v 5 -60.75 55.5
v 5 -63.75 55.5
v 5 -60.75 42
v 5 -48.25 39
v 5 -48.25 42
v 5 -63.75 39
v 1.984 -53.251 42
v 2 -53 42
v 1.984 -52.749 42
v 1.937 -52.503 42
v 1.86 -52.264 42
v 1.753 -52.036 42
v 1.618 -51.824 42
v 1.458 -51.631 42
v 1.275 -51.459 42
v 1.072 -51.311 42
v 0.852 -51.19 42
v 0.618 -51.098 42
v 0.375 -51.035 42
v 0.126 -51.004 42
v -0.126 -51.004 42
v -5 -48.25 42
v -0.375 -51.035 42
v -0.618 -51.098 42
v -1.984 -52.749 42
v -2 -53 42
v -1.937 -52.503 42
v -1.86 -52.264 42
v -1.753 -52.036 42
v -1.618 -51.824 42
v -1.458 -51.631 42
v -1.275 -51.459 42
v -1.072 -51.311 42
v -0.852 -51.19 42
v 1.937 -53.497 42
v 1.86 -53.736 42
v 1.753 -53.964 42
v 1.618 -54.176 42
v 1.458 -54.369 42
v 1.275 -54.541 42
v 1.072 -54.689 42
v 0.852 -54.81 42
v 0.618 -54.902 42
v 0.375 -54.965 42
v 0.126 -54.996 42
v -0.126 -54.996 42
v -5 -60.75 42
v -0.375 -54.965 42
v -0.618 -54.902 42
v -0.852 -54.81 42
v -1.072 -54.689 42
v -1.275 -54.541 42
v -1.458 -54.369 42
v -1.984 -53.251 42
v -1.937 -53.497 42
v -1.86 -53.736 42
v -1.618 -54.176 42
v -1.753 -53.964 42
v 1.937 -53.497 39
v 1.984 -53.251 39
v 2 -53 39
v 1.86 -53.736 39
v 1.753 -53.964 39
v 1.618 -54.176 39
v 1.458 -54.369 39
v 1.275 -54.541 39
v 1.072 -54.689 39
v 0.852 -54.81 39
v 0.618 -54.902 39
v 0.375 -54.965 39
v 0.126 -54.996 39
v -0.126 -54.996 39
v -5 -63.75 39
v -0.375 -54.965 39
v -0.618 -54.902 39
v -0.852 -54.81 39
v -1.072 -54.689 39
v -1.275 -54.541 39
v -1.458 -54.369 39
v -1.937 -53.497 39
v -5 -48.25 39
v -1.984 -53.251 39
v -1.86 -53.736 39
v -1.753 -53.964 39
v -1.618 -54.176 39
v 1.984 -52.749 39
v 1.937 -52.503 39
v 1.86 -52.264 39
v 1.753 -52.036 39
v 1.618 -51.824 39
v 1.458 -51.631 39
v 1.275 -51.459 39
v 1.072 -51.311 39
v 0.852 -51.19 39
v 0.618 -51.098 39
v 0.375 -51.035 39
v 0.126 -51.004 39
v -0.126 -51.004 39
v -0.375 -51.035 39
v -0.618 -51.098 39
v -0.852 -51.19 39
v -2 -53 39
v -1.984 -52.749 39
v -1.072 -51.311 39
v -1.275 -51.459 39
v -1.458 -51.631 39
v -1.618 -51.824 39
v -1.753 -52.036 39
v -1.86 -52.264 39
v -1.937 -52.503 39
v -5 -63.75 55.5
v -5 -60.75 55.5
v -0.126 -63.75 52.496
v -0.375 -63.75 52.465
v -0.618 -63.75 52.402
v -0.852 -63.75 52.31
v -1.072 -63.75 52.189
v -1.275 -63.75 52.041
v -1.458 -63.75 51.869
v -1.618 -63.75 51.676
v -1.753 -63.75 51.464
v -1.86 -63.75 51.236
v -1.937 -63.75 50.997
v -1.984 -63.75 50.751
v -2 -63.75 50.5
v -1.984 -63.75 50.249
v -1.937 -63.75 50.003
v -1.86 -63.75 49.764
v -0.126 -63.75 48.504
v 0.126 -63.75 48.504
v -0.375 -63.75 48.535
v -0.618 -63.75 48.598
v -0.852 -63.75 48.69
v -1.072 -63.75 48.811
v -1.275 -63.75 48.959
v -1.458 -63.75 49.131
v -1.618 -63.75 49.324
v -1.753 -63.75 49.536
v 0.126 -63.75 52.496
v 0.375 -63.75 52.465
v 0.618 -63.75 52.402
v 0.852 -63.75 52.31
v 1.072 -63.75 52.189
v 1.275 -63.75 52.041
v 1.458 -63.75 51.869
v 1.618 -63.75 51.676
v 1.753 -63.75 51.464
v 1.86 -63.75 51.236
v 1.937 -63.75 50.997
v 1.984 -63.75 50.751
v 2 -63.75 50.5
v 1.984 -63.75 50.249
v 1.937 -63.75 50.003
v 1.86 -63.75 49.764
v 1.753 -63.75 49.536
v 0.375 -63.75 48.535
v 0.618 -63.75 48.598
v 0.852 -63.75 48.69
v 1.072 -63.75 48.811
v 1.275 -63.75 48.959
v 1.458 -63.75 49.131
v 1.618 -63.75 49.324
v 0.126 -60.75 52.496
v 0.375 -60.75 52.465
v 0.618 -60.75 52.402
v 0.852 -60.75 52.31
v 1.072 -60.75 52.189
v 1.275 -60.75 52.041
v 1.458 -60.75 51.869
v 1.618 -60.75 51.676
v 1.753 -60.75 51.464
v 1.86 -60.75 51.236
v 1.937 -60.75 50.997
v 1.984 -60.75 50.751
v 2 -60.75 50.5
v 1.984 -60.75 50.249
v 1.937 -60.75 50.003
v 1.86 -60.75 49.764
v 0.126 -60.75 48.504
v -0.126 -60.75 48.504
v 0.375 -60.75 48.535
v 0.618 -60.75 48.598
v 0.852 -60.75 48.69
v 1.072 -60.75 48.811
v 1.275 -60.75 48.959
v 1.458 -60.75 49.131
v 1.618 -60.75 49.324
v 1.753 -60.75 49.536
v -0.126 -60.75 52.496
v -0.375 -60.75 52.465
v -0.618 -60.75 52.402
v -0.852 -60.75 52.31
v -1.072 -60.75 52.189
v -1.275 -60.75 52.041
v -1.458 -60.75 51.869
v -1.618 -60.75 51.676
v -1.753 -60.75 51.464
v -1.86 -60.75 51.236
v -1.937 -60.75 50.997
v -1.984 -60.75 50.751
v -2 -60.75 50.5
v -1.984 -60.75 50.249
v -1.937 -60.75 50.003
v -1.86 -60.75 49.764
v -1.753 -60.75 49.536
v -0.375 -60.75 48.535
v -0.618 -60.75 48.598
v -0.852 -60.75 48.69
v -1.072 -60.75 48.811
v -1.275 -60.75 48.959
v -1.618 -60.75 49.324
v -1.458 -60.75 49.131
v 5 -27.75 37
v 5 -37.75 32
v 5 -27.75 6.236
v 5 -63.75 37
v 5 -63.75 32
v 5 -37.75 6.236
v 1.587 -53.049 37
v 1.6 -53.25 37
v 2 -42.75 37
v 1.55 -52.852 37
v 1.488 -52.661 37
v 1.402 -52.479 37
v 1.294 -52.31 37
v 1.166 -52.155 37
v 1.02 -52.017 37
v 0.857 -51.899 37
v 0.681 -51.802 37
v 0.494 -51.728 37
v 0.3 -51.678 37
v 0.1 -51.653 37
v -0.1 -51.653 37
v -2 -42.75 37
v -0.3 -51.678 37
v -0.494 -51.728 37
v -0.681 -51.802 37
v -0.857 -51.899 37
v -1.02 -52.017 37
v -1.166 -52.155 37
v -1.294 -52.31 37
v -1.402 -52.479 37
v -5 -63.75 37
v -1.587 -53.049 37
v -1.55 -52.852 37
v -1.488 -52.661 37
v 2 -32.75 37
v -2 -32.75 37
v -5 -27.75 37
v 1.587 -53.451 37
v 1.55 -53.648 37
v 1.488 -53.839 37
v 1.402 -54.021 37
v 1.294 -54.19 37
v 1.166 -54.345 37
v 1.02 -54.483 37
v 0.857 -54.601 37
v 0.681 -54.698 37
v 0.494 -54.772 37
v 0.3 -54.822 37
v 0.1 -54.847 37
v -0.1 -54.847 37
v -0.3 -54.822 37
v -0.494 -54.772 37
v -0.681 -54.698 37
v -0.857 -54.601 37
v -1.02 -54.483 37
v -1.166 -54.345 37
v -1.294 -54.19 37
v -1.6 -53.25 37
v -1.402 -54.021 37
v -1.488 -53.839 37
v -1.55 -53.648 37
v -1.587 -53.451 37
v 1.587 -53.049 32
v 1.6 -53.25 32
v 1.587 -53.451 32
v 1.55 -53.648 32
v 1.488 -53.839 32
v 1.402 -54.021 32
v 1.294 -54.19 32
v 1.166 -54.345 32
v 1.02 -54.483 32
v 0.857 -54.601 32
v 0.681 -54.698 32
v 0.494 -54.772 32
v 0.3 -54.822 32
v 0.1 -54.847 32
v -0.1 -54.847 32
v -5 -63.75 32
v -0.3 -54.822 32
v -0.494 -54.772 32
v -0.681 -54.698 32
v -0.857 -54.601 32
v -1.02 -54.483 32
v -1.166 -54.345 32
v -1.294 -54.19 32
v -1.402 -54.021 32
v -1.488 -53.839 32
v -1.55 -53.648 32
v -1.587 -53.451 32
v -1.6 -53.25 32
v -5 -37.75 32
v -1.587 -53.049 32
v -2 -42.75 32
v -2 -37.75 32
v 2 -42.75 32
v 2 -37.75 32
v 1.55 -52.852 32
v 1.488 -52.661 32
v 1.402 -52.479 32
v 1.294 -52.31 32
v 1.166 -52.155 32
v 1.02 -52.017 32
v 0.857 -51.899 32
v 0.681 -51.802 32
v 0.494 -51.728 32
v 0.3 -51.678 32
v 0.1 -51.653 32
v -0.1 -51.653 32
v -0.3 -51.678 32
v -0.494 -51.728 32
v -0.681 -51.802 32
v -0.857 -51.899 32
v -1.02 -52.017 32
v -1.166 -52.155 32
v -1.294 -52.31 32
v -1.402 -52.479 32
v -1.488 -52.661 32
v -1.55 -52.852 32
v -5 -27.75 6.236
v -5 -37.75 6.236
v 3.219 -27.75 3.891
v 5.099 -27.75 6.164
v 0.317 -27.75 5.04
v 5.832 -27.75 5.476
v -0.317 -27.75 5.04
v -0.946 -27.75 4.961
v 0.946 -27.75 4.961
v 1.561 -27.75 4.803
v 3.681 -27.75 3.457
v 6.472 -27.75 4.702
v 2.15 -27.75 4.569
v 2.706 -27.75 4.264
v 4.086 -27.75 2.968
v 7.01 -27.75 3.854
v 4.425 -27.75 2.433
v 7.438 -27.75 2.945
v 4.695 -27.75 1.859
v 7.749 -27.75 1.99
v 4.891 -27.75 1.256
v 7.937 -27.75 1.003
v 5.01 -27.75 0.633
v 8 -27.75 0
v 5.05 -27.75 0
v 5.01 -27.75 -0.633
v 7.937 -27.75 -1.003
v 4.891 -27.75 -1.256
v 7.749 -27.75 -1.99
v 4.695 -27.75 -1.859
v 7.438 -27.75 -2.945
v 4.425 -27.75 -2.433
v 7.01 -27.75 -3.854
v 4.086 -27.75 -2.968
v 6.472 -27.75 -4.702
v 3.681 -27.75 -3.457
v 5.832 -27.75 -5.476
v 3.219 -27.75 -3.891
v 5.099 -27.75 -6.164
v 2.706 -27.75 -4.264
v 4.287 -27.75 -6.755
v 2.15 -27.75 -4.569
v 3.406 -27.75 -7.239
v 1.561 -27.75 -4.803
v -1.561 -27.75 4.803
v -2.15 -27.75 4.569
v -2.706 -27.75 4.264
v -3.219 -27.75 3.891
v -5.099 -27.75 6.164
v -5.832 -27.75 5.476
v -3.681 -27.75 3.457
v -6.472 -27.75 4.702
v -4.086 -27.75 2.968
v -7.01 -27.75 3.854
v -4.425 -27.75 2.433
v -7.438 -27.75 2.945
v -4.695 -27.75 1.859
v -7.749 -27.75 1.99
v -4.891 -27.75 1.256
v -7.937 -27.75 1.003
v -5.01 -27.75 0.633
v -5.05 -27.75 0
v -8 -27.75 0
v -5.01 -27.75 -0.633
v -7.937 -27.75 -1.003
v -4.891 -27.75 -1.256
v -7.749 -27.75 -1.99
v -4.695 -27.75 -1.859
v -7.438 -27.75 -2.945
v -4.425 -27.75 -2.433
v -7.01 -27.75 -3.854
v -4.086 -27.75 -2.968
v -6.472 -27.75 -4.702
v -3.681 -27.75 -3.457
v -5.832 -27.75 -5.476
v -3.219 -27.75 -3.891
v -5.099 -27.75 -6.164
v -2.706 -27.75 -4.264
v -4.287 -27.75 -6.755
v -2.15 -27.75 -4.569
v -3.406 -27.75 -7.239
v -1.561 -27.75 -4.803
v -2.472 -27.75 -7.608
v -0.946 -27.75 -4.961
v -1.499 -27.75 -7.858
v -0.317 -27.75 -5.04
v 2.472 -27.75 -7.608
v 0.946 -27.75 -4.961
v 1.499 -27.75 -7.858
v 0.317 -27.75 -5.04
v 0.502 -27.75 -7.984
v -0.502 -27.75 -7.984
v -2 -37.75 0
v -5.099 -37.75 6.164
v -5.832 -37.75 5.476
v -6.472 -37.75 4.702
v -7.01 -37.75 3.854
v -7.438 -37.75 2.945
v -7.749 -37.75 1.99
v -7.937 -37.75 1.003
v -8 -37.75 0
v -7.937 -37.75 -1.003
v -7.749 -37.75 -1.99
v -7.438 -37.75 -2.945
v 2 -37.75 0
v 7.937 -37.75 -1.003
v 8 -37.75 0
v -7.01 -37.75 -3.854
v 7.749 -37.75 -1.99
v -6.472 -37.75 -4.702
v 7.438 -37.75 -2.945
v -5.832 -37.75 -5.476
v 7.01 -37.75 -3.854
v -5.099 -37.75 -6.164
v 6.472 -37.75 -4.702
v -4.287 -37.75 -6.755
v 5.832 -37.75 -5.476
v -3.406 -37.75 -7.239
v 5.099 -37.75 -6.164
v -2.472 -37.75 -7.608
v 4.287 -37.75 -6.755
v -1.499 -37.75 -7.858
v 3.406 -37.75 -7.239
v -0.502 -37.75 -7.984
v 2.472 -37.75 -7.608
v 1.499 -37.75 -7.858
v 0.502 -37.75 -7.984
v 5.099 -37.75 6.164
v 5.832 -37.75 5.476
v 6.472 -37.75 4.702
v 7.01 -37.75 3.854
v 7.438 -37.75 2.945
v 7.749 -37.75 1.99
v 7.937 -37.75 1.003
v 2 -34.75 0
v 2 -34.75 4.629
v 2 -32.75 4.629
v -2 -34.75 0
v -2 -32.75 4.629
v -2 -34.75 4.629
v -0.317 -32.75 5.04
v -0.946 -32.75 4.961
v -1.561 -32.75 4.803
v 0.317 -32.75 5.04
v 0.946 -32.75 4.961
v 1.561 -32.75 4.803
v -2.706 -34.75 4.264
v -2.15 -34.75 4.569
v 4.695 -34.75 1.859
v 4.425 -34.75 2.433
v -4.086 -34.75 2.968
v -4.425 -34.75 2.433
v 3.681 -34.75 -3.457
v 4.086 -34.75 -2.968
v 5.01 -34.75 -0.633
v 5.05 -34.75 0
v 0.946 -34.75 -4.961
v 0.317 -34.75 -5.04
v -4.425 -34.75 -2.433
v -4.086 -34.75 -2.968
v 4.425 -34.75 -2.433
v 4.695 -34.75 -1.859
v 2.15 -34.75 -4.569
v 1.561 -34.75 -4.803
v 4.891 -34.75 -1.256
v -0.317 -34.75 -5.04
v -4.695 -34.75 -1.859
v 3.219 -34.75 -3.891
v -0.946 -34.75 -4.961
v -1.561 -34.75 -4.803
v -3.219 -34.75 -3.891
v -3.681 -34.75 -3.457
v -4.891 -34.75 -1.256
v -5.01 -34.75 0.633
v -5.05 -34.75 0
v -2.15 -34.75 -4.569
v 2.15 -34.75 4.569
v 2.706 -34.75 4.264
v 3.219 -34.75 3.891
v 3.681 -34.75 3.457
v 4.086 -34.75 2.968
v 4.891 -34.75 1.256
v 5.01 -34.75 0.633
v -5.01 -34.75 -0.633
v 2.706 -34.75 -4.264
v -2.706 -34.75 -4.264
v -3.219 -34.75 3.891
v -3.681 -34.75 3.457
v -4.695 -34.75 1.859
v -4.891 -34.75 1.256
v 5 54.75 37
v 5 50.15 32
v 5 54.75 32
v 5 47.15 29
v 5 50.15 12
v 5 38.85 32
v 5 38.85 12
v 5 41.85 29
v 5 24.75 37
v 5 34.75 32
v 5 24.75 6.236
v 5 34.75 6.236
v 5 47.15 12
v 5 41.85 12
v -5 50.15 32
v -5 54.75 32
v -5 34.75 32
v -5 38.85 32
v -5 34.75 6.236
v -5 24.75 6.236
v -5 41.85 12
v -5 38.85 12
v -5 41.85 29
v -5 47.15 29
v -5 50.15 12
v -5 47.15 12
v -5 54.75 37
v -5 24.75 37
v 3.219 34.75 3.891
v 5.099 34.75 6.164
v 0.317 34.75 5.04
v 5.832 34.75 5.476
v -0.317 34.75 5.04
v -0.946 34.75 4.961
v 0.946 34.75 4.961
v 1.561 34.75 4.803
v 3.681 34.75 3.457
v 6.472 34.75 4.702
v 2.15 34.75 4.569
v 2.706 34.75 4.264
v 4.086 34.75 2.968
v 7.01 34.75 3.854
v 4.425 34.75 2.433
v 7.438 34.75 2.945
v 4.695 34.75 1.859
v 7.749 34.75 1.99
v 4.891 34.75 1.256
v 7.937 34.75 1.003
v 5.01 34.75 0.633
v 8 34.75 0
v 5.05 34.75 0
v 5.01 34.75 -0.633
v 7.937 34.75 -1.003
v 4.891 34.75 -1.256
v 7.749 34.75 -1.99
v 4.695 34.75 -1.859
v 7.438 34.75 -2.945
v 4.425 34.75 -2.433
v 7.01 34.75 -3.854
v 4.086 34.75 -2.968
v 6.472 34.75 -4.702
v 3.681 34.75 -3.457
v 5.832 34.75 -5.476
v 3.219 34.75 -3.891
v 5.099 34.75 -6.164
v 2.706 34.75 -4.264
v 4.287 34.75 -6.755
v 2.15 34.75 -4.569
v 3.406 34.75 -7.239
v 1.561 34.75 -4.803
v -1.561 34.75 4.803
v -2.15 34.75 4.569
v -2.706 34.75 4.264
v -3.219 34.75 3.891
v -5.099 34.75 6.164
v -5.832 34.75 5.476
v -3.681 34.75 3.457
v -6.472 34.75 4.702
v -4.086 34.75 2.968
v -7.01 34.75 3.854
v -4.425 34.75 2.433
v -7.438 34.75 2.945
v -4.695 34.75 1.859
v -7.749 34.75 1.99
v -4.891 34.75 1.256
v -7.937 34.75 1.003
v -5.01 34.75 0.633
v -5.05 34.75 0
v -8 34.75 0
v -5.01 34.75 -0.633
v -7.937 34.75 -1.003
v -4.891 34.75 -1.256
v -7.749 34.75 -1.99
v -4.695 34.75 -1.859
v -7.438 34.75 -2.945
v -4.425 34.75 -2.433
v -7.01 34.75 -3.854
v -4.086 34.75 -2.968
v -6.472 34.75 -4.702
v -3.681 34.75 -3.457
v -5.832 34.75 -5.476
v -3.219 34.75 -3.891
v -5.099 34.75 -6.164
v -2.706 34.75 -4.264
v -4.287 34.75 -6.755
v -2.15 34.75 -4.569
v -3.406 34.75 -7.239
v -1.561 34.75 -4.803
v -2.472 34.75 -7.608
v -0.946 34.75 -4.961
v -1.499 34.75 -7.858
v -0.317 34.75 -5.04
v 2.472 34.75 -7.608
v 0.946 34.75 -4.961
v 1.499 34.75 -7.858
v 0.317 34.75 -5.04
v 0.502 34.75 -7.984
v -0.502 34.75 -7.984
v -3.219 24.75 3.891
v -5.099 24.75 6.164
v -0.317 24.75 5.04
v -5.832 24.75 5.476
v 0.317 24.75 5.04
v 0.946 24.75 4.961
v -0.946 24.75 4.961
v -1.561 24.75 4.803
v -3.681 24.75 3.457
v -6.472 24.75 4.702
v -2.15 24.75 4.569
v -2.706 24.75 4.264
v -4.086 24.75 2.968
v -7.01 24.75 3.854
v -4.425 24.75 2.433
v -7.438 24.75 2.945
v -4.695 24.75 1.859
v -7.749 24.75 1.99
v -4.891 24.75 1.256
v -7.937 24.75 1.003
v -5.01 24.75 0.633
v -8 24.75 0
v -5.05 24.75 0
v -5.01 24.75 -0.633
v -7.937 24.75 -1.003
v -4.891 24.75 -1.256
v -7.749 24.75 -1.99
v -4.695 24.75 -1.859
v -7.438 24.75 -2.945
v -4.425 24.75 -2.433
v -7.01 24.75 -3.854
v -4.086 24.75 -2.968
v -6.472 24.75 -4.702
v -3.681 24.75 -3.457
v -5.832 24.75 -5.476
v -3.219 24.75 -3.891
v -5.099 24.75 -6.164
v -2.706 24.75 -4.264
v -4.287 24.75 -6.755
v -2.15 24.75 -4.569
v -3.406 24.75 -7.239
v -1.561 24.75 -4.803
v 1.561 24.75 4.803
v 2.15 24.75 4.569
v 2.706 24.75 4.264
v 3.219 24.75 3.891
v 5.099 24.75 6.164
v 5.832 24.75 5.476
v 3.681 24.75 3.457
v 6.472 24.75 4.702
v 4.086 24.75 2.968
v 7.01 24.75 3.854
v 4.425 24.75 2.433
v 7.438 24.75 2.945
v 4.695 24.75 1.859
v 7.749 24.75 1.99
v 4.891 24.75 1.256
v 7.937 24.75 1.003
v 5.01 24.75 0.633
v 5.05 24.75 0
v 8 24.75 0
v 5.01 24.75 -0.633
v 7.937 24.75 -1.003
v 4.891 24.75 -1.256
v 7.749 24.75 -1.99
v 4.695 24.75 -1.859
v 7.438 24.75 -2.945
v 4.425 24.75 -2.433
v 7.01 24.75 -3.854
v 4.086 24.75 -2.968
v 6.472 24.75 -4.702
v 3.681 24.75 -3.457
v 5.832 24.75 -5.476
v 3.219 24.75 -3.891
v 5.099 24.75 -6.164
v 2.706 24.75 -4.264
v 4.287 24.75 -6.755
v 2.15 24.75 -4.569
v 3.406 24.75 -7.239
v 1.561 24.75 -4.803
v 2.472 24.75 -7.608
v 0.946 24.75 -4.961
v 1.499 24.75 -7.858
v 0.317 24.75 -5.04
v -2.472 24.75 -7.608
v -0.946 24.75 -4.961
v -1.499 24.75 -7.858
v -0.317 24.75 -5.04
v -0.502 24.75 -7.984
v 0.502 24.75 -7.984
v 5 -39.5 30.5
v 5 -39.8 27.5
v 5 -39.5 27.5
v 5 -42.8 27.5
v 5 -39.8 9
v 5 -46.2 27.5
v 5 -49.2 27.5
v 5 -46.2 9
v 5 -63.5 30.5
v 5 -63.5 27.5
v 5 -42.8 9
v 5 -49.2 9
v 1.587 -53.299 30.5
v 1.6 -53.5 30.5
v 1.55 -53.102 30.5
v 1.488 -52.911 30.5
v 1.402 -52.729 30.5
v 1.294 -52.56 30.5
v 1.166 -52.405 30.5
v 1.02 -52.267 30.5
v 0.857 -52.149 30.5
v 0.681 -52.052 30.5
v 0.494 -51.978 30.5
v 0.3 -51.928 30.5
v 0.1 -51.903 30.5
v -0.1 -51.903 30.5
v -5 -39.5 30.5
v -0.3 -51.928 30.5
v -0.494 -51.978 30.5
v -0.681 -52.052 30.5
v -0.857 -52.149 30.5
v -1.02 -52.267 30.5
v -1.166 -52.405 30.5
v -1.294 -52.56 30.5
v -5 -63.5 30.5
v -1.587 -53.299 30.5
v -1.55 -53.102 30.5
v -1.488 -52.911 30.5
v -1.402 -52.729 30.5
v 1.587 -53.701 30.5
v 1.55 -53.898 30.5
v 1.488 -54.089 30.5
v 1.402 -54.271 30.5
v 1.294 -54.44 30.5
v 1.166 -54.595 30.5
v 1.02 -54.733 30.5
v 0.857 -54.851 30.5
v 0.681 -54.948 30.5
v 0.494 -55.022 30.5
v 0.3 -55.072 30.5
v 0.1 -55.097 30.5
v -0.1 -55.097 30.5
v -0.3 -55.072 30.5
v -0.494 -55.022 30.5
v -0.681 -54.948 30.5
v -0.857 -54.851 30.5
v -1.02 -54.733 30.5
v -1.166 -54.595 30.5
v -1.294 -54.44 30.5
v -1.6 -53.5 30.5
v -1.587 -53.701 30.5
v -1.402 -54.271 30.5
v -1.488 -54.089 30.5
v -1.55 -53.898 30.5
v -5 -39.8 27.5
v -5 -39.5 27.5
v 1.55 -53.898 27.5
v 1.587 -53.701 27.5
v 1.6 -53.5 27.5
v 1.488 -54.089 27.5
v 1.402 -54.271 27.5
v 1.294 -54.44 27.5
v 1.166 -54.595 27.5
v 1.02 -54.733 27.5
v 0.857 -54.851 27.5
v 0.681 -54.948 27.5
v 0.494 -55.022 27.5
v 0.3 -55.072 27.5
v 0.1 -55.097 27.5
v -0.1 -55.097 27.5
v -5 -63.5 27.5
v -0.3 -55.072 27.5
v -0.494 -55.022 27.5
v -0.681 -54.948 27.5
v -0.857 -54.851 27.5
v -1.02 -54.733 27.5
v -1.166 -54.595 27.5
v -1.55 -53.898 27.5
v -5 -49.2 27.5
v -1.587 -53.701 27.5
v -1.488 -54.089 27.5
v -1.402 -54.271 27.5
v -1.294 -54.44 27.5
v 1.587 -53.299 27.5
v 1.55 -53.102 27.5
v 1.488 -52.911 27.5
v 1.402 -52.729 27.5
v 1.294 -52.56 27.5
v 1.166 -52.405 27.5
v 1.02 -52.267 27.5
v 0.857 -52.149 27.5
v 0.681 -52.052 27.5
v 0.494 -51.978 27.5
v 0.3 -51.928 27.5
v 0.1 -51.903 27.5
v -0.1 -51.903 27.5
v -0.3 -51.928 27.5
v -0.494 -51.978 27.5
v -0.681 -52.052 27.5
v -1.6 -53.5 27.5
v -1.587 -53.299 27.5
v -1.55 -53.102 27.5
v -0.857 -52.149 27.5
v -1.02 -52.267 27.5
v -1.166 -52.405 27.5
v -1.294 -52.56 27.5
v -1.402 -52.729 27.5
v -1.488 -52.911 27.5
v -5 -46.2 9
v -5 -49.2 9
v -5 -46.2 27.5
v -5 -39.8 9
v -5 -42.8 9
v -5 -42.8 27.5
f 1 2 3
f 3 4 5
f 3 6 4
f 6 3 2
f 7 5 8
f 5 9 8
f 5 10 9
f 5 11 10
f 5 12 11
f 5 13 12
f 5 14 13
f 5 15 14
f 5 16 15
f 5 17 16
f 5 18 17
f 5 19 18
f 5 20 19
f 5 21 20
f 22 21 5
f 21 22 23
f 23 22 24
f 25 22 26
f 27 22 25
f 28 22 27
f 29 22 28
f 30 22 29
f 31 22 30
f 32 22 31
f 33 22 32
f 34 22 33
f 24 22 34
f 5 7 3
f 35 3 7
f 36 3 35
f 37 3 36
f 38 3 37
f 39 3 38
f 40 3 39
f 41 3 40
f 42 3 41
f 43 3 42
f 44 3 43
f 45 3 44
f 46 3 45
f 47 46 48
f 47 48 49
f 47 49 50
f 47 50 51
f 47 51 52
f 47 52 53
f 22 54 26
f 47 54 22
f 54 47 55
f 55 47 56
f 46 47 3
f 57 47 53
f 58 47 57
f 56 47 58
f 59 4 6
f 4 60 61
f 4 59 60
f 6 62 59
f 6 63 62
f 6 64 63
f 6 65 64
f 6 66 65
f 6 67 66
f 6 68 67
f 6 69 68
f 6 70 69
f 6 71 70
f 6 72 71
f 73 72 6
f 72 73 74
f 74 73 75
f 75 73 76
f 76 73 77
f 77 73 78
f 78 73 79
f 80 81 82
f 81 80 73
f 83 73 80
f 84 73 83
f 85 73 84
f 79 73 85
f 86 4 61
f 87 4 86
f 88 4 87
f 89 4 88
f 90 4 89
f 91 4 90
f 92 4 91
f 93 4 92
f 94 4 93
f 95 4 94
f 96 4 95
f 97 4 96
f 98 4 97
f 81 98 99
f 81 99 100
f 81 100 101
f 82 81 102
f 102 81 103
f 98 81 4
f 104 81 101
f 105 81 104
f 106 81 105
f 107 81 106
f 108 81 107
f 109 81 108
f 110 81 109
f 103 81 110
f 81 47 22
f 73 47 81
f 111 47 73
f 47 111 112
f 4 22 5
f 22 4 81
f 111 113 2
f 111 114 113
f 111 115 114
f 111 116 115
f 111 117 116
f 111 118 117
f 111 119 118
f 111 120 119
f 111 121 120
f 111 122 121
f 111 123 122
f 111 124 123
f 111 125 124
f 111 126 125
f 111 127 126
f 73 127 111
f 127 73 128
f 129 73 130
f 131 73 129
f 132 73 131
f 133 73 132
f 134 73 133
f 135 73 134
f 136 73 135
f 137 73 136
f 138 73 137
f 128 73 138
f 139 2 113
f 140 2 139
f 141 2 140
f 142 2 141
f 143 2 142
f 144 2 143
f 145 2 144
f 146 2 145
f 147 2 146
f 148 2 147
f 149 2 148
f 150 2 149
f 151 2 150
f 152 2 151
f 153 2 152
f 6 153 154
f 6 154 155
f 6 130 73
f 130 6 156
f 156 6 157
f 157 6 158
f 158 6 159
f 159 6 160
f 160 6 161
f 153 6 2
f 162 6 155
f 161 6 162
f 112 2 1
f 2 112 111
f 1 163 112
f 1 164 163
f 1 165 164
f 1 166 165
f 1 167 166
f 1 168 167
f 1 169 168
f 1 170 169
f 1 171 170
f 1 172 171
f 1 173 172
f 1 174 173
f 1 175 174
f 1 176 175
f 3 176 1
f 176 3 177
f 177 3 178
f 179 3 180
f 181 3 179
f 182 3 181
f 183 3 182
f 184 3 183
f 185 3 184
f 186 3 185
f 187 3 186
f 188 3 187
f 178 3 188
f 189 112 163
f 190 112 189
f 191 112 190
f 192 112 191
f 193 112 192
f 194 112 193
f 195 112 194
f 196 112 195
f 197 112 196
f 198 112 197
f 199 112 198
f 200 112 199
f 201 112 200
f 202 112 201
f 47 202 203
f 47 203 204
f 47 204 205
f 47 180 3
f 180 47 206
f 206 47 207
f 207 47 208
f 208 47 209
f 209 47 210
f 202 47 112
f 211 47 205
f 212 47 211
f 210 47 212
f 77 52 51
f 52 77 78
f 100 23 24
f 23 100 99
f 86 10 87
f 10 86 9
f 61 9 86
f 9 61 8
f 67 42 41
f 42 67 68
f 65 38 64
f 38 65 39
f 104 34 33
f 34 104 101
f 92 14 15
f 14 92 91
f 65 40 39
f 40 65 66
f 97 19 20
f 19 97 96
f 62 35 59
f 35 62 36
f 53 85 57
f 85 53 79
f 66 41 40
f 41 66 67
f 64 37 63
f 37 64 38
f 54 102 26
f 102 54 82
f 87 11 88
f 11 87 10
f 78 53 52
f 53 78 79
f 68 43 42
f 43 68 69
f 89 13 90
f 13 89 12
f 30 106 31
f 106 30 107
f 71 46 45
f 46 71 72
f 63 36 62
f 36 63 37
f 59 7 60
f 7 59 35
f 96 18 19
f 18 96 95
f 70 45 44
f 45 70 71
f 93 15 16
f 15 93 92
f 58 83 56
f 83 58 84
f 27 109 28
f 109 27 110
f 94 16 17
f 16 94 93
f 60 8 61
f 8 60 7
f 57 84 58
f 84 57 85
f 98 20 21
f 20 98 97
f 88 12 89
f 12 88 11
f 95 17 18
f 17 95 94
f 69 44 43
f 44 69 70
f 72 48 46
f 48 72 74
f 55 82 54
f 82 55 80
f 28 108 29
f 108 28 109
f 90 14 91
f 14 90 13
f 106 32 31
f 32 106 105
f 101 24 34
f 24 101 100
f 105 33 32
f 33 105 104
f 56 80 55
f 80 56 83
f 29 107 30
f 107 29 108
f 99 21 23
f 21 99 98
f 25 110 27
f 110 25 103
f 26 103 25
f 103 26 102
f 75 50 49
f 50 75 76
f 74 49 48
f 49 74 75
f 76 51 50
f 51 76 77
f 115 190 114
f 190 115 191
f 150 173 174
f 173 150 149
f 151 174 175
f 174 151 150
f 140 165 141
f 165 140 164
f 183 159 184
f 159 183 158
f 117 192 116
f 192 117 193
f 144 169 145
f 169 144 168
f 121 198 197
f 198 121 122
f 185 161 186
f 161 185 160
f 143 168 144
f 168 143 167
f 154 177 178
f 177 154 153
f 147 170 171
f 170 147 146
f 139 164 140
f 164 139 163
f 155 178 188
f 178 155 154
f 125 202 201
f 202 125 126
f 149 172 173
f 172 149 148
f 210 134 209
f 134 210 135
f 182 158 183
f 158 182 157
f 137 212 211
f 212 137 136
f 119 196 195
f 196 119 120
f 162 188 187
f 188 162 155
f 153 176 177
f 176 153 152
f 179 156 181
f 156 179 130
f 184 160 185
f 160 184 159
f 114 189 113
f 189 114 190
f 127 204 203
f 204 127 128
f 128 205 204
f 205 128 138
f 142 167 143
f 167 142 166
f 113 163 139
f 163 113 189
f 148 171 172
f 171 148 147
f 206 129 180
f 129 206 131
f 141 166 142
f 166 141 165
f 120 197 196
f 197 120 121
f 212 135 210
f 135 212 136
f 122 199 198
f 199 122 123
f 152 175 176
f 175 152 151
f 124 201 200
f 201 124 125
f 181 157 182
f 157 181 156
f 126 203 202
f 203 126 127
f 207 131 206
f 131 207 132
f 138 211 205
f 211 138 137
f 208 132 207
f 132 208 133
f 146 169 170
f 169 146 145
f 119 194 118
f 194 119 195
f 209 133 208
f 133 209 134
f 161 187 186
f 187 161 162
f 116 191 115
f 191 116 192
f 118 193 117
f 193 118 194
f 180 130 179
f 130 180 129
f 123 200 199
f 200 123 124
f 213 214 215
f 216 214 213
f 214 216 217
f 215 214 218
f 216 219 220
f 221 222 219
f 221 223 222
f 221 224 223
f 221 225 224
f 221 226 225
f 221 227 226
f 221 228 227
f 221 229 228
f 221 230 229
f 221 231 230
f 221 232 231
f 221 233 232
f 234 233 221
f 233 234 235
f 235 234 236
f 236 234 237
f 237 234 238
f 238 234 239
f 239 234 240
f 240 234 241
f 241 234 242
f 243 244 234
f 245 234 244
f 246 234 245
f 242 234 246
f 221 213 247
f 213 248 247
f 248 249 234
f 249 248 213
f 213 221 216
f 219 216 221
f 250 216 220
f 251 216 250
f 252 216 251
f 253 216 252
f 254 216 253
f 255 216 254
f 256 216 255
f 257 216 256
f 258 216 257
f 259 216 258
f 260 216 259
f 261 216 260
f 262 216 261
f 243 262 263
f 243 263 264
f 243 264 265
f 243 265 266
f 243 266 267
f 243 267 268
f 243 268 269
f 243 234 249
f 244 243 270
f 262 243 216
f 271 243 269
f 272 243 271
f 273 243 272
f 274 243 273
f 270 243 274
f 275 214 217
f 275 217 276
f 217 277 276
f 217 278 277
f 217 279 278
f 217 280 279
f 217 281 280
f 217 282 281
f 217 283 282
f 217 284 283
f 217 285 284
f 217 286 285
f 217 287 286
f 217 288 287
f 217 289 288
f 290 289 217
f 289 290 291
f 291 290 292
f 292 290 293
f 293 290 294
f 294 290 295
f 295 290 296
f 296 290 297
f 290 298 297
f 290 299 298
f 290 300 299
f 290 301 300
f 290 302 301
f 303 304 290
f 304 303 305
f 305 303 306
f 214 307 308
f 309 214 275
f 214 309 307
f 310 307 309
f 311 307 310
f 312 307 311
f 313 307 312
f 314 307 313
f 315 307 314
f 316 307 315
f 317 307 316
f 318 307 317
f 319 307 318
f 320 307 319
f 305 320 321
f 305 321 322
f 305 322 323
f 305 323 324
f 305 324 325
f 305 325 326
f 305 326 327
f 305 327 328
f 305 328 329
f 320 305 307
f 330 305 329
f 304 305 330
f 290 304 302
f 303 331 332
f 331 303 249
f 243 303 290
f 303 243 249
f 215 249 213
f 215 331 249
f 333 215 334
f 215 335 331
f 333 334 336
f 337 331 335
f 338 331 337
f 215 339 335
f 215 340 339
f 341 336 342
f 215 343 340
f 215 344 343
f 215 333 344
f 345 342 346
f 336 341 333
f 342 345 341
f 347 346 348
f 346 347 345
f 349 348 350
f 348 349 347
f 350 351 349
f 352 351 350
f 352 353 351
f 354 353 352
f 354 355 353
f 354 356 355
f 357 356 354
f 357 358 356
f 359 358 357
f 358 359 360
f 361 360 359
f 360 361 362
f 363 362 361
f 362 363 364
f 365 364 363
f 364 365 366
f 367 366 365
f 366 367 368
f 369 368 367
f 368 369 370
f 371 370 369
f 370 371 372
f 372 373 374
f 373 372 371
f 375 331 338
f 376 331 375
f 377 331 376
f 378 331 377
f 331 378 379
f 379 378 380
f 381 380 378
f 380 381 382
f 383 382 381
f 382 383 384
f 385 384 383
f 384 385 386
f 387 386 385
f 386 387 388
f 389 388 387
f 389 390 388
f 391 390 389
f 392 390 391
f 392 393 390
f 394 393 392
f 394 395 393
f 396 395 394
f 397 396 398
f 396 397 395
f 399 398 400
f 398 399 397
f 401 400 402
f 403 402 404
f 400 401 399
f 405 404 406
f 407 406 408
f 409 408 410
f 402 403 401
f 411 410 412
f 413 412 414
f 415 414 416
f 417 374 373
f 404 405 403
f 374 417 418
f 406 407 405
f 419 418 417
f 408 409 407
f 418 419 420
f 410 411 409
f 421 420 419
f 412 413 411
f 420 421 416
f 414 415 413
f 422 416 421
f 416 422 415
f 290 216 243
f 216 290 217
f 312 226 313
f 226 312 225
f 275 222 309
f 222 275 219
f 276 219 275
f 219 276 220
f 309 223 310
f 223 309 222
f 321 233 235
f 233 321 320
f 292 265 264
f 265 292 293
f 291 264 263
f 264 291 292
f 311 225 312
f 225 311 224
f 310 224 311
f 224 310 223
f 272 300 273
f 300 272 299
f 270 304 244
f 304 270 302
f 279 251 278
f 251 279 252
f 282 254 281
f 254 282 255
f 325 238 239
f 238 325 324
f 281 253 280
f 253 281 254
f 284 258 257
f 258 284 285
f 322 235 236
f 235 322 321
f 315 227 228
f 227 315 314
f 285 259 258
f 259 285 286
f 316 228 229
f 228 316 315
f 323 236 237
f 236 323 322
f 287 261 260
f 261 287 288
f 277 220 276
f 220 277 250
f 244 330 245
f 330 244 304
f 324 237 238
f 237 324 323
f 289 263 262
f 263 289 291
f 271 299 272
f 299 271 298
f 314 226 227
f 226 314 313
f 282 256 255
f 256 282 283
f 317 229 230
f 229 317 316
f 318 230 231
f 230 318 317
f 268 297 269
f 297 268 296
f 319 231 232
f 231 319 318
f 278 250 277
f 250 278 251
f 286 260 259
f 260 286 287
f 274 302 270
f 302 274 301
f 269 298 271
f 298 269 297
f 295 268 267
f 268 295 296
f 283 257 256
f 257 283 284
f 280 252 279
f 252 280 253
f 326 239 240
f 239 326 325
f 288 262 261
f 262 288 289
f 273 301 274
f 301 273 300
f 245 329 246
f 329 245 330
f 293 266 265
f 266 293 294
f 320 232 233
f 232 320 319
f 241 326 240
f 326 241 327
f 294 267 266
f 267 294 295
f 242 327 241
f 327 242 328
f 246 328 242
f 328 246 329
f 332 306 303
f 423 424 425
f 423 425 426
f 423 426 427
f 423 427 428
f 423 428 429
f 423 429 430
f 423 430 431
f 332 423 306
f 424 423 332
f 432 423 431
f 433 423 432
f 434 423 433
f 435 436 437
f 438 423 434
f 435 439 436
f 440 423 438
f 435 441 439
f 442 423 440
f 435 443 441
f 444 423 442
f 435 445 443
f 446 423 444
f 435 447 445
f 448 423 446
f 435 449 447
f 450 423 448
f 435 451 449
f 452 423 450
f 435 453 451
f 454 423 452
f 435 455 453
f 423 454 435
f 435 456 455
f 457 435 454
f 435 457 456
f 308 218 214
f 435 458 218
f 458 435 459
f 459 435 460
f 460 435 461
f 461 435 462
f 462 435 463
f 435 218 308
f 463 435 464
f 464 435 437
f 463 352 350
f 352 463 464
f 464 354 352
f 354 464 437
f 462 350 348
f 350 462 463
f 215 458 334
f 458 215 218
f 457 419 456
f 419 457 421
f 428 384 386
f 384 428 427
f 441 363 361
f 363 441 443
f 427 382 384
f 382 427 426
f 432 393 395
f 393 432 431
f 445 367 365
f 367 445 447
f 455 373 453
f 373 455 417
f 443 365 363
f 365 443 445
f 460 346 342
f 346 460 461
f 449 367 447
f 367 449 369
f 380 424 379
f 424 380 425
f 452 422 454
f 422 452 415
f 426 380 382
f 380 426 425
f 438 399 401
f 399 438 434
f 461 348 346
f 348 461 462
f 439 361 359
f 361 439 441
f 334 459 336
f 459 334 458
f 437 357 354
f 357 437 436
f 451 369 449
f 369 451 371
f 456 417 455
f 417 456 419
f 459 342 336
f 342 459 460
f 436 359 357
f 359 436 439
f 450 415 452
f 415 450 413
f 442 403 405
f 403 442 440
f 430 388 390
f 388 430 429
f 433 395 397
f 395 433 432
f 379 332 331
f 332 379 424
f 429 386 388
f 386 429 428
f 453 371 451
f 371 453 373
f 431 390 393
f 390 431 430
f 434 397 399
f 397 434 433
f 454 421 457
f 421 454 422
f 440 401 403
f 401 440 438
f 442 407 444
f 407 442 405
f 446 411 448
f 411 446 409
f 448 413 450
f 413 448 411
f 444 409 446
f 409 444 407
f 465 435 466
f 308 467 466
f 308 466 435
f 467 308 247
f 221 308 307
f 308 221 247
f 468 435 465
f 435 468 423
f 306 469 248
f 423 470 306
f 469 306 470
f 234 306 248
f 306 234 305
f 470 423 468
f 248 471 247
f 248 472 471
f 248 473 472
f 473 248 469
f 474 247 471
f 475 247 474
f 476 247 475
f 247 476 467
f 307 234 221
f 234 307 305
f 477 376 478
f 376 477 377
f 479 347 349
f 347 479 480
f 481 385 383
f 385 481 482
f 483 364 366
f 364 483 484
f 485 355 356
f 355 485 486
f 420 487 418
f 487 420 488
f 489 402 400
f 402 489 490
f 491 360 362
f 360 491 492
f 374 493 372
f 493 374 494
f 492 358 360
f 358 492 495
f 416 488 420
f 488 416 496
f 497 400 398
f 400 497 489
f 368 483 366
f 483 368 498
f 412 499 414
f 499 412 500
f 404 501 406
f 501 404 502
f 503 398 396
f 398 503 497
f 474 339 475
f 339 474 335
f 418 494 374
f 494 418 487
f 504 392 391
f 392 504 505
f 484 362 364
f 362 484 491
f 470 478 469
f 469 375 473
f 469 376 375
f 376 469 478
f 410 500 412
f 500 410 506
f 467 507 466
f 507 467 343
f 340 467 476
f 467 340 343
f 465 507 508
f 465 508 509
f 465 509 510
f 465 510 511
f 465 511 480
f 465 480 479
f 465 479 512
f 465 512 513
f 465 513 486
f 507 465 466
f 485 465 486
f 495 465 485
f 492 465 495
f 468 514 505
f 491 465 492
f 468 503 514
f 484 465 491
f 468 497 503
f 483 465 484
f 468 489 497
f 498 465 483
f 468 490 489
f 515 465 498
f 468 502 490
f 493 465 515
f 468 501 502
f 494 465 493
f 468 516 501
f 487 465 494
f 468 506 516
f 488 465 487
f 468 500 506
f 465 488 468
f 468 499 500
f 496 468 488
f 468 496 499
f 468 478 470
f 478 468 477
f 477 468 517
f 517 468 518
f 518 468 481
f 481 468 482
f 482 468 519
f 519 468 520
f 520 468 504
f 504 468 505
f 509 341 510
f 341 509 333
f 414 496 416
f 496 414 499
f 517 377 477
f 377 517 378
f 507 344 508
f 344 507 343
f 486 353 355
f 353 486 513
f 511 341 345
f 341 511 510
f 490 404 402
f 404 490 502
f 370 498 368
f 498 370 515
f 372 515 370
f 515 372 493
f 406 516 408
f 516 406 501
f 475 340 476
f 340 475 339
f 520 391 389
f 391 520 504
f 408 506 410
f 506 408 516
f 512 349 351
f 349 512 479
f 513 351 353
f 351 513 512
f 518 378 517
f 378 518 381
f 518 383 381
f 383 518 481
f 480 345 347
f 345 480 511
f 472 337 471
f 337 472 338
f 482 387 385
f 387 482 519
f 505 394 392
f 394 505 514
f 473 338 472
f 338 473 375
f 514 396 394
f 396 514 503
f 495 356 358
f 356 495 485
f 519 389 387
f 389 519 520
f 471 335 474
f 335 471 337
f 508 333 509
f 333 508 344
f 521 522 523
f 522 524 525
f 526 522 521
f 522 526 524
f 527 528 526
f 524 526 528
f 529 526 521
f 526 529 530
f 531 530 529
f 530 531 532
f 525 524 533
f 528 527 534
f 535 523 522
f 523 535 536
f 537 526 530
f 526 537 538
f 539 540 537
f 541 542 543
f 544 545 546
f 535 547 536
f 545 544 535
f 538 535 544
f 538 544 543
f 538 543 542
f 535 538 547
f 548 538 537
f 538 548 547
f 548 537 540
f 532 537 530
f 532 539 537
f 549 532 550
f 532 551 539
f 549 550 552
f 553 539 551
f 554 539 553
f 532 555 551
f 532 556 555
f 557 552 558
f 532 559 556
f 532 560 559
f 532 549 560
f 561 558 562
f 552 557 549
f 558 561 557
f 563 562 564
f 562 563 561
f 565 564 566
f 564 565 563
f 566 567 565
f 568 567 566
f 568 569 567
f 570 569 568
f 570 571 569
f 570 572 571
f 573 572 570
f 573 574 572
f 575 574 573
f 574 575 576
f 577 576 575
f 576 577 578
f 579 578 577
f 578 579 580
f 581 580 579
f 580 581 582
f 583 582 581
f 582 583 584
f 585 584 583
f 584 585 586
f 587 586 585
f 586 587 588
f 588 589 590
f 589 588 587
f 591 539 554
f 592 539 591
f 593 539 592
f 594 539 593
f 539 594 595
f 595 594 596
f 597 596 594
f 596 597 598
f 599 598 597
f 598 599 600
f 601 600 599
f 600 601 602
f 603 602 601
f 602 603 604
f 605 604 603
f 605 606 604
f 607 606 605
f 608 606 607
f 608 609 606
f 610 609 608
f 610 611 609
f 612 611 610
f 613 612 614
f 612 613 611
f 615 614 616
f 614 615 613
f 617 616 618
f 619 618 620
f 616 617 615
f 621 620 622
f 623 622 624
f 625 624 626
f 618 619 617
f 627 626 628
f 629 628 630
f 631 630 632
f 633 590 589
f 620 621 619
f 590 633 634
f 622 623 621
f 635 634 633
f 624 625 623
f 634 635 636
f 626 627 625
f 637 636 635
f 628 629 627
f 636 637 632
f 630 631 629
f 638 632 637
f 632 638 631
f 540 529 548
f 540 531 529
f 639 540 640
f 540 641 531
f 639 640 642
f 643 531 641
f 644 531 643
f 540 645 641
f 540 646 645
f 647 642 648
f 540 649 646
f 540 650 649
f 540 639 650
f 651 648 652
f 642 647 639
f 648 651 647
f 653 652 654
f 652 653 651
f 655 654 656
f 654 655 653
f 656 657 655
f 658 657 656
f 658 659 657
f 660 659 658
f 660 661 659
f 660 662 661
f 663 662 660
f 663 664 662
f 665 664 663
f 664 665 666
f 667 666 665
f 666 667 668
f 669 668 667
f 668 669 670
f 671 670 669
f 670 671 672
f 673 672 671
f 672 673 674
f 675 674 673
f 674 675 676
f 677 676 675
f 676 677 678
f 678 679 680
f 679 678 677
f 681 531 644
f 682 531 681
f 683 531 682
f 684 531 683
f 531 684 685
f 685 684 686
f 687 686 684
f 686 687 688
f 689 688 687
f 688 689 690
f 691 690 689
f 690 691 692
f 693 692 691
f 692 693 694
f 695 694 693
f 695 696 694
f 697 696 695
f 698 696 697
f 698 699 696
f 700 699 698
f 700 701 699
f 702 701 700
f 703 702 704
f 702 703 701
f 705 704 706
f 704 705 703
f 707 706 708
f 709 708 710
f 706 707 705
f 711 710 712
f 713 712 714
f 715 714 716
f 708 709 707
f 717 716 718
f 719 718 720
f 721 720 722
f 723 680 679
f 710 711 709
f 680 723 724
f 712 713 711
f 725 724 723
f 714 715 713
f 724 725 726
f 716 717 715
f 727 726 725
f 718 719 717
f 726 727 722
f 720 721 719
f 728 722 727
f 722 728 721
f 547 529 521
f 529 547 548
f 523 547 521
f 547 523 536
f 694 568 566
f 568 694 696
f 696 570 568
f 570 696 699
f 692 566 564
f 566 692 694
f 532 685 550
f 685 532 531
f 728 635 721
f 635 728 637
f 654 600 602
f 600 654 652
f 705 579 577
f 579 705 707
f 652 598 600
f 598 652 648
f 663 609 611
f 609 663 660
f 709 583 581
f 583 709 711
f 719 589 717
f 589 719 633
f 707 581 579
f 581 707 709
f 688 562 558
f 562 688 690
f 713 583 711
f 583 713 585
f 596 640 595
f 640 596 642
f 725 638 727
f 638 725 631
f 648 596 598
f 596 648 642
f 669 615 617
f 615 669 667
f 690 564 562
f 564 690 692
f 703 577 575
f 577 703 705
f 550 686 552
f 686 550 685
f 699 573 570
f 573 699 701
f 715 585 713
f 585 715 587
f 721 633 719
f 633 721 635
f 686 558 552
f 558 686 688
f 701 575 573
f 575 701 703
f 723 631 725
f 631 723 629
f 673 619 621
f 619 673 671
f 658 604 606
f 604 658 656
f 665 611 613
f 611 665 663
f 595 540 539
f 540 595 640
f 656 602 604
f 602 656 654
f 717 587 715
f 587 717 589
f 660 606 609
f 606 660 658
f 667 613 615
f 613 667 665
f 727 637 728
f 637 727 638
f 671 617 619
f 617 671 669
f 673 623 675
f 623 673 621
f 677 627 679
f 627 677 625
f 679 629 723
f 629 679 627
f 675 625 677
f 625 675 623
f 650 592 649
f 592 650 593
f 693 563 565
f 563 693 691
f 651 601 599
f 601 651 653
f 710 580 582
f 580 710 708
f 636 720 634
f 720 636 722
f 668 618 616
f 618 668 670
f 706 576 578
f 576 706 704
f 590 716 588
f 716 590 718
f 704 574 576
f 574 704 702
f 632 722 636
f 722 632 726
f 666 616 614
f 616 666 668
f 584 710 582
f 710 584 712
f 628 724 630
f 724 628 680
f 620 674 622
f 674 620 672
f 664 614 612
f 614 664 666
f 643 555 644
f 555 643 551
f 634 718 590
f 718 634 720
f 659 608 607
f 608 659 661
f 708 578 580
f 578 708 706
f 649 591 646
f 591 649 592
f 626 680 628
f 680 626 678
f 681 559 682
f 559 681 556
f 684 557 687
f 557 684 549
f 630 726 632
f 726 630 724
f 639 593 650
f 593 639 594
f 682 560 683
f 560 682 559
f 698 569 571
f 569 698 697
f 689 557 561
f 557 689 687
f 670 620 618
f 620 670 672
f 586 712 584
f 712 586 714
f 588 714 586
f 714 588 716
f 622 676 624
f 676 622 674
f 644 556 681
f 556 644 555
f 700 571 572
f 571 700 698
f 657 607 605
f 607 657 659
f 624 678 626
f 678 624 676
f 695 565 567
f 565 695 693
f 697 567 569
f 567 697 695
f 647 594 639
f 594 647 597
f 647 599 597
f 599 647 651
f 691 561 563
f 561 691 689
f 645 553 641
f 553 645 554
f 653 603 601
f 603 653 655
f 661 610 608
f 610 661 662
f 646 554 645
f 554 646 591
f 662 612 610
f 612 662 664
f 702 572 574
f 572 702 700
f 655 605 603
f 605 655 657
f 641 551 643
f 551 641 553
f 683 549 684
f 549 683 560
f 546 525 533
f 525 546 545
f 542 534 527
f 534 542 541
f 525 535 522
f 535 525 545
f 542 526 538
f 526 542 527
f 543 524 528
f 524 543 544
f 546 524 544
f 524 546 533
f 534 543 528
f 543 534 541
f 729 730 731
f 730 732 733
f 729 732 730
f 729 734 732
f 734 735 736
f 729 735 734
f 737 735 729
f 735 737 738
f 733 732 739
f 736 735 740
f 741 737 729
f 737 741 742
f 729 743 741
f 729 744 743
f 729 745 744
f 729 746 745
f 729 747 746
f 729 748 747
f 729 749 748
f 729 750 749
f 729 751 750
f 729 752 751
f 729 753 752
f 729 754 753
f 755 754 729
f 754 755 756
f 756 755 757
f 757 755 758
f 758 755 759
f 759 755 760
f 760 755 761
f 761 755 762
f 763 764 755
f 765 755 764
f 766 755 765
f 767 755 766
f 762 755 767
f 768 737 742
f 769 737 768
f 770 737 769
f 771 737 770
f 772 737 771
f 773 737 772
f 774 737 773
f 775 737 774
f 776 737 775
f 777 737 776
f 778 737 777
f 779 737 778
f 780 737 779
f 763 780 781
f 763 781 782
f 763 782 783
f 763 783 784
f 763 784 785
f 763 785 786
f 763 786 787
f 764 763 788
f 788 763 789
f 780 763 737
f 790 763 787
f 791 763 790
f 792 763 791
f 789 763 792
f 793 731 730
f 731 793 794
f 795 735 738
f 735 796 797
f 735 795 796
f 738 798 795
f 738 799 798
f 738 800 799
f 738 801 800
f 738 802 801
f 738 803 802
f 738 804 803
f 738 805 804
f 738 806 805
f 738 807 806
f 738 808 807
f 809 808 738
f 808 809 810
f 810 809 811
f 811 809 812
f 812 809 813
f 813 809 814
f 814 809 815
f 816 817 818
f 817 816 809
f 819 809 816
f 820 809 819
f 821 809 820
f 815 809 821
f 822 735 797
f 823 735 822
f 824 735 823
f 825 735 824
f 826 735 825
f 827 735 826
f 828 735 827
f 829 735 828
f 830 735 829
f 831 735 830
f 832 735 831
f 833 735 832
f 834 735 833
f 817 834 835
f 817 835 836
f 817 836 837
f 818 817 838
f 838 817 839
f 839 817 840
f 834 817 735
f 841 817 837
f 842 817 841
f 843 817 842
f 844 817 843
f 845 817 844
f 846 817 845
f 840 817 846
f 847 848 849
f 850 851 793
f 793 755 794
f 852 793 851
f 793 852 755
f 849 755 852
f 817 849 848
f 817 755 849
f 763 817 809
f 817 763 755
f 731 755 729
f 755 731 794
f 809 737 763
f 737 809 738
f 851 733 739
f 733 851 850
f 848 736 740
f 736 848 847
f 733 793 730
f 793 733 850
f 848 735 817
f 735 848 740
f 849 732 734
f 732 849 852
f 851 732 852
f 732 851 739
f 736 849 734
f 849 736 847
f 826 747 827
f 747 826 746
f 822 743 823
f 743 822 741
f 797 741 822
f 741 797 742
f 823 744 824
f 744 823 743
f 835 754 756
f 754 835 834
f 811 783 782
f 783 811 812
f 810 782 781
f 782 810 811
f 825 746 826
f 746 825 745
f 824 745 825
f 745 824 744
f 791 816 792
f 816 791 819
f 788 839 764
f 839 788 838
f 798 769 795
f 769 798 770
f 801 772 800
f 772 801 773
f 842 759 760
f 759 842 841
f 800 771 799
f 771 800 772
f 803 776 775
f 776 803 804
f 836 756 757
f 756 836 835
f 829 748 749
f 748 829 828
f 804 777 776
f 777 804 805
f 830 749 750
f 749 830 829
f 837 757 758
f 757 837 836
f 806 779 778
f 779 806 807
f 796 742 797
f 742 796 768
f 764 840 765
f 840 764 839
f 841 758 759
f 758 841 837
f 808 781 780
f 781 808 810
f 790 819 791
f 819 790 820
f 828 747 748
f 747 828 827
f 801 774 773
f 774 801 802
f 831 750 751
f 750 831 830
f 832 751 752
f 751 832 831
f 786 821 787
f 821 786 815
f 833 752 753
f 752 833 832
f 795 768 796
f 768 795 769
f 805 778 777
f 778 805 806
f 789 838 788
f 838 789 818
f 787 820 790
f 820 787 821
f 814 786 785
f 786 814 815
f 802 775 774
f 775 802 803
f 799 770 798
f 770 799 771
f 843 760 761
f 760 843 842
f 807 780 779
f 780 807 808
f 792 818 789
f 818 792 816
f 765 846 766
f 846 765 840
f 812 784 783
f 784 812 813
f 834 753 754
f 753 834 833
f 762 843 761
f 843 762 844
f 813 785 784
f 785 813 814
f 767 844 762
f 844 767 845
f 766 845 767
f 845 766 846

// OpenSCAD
$fn = 50;

// for electrode

gap = 0.5;
wall = 3;
electrode_sz_z = 32;

max_sz_y = 86.5;

h=max_sz_y - 2 * wall - 2 * gap - 10;

electrode_d = 9.5;

holder_d = electrode_d + 2 * wall + gap;
holder_sz_y = 10;

module isolat(extra_d=0) {
  d = electrode_d+extra_d;
  rotate([90, 0, 0]) {
    difference() {
      union() {
        cylinder(d=d, h=h, center=true);
      }
    }
  }
}


module hook() {
  difference() {
    translate([0, holder_sz_y-h/2-wall, 0]) {
      difference() {
        union() {
          rotate([90, 0, 0]) {
            cylinder(d=holder_d, h=holder_sz_y);
          }
          translate([0, -holder_sz_y/2, electrode_sz_z/2]) {
            cube([4+2*wall, holder_sz_y, electrode_sz_z], center=true);
            translate([0, -18+holder_sz_y/2, (electrode_sz_z+5)/2]) {
              difference() {
                cube([4+2*wall, 36, 5], center=true);
                translate([0, -7.5, 0]) {
                  cylinder(d=3.2, h=40, center=true);
                }
              }
            }
          }
        }
        translate([0, -holder_sz_y, electrode_sz_z/2+5]) {
          cube([4, holder_sz_y, electrode_sz_z+10], center=true);
        }
      }
    }
    hull() {
      isolat(0.6);
    }
  }
}

module holder_hook() {
  difference() {
    translate([0, holder_sz_y-h/2-wall, 0]) {
      difference() {
        union() {
          rotate([90, 0, 0]) {
            cylinder(d=holder_d, h=holder_sz_y);
          }
          translate([0, -holder_sz_y/2, electrode_sz_z/2]) {
            cube([4+2*wall, holder_sz_y, electrode_sz_z], center=true);
            translate([0, +15-holder_sz_y/2, (electrode_sz_z+5)/2]) {
              difference() {
                cube([4+2*wall, 30, 5], center=true);
              }
            }
          }
        }
      }
    }
    translate([0, -10, 0]) {
        hull() {
          isolat(0.6);
        }
    }
  }
  translate([0, -18, 22]) {
    difference() {
      union() {
        cube([4+2*wall, 2*wall+5.3, 20], center=true);
      }
      translate([0, 0, -wall]) {
        cube([4+2*wall, 5.3, 20], center=true);
      }
    }
  }
}

module socket() {
  difference() {
    union() {
      cube([4+2*wall, 15.5, wall], center=true);
      translate([0, -7.75+wall/2, 7.5]) {
        cube([4+2*wall, wall, 15], center=true);
      }
    }
    translate([0, 3, 0]) {
      cylinder(d=4, h=40, center=true);
    }
    translate([0, 0, 10]) {
      rotate([90, 0, 0]) {
        cylinder(d=4, h=40, center=true);
      }
    }
  }
}

module lock() {
  difference() {
    union() {
      // top
      translate([0, -7, 10]) {
        cube([4+2*wall, 24, wall], center=true);
      }
      cube([4+2*wall, 2*wall+3.4, 20], center=true);
    }
    translate([0, 0, -wall/2]) {
      cube([4+2*wall, 3.4, 20], center=true);
    }
    translate([0, -9, 0]) {
      cylinder(d=3.2, h=50, center=true);
    }
  }
}


%isolat();
translate([0, holder_sz_y-h+6.5-3, electrode_sz_z+wall/2+4+wall]) {
  socket();
}
hook();
translate([0, h-7, 0]) {
  holder_hook();
}
translate([0, holder_sz_y-h+15, electrode_sz_z-13]) {
  lock();
}
